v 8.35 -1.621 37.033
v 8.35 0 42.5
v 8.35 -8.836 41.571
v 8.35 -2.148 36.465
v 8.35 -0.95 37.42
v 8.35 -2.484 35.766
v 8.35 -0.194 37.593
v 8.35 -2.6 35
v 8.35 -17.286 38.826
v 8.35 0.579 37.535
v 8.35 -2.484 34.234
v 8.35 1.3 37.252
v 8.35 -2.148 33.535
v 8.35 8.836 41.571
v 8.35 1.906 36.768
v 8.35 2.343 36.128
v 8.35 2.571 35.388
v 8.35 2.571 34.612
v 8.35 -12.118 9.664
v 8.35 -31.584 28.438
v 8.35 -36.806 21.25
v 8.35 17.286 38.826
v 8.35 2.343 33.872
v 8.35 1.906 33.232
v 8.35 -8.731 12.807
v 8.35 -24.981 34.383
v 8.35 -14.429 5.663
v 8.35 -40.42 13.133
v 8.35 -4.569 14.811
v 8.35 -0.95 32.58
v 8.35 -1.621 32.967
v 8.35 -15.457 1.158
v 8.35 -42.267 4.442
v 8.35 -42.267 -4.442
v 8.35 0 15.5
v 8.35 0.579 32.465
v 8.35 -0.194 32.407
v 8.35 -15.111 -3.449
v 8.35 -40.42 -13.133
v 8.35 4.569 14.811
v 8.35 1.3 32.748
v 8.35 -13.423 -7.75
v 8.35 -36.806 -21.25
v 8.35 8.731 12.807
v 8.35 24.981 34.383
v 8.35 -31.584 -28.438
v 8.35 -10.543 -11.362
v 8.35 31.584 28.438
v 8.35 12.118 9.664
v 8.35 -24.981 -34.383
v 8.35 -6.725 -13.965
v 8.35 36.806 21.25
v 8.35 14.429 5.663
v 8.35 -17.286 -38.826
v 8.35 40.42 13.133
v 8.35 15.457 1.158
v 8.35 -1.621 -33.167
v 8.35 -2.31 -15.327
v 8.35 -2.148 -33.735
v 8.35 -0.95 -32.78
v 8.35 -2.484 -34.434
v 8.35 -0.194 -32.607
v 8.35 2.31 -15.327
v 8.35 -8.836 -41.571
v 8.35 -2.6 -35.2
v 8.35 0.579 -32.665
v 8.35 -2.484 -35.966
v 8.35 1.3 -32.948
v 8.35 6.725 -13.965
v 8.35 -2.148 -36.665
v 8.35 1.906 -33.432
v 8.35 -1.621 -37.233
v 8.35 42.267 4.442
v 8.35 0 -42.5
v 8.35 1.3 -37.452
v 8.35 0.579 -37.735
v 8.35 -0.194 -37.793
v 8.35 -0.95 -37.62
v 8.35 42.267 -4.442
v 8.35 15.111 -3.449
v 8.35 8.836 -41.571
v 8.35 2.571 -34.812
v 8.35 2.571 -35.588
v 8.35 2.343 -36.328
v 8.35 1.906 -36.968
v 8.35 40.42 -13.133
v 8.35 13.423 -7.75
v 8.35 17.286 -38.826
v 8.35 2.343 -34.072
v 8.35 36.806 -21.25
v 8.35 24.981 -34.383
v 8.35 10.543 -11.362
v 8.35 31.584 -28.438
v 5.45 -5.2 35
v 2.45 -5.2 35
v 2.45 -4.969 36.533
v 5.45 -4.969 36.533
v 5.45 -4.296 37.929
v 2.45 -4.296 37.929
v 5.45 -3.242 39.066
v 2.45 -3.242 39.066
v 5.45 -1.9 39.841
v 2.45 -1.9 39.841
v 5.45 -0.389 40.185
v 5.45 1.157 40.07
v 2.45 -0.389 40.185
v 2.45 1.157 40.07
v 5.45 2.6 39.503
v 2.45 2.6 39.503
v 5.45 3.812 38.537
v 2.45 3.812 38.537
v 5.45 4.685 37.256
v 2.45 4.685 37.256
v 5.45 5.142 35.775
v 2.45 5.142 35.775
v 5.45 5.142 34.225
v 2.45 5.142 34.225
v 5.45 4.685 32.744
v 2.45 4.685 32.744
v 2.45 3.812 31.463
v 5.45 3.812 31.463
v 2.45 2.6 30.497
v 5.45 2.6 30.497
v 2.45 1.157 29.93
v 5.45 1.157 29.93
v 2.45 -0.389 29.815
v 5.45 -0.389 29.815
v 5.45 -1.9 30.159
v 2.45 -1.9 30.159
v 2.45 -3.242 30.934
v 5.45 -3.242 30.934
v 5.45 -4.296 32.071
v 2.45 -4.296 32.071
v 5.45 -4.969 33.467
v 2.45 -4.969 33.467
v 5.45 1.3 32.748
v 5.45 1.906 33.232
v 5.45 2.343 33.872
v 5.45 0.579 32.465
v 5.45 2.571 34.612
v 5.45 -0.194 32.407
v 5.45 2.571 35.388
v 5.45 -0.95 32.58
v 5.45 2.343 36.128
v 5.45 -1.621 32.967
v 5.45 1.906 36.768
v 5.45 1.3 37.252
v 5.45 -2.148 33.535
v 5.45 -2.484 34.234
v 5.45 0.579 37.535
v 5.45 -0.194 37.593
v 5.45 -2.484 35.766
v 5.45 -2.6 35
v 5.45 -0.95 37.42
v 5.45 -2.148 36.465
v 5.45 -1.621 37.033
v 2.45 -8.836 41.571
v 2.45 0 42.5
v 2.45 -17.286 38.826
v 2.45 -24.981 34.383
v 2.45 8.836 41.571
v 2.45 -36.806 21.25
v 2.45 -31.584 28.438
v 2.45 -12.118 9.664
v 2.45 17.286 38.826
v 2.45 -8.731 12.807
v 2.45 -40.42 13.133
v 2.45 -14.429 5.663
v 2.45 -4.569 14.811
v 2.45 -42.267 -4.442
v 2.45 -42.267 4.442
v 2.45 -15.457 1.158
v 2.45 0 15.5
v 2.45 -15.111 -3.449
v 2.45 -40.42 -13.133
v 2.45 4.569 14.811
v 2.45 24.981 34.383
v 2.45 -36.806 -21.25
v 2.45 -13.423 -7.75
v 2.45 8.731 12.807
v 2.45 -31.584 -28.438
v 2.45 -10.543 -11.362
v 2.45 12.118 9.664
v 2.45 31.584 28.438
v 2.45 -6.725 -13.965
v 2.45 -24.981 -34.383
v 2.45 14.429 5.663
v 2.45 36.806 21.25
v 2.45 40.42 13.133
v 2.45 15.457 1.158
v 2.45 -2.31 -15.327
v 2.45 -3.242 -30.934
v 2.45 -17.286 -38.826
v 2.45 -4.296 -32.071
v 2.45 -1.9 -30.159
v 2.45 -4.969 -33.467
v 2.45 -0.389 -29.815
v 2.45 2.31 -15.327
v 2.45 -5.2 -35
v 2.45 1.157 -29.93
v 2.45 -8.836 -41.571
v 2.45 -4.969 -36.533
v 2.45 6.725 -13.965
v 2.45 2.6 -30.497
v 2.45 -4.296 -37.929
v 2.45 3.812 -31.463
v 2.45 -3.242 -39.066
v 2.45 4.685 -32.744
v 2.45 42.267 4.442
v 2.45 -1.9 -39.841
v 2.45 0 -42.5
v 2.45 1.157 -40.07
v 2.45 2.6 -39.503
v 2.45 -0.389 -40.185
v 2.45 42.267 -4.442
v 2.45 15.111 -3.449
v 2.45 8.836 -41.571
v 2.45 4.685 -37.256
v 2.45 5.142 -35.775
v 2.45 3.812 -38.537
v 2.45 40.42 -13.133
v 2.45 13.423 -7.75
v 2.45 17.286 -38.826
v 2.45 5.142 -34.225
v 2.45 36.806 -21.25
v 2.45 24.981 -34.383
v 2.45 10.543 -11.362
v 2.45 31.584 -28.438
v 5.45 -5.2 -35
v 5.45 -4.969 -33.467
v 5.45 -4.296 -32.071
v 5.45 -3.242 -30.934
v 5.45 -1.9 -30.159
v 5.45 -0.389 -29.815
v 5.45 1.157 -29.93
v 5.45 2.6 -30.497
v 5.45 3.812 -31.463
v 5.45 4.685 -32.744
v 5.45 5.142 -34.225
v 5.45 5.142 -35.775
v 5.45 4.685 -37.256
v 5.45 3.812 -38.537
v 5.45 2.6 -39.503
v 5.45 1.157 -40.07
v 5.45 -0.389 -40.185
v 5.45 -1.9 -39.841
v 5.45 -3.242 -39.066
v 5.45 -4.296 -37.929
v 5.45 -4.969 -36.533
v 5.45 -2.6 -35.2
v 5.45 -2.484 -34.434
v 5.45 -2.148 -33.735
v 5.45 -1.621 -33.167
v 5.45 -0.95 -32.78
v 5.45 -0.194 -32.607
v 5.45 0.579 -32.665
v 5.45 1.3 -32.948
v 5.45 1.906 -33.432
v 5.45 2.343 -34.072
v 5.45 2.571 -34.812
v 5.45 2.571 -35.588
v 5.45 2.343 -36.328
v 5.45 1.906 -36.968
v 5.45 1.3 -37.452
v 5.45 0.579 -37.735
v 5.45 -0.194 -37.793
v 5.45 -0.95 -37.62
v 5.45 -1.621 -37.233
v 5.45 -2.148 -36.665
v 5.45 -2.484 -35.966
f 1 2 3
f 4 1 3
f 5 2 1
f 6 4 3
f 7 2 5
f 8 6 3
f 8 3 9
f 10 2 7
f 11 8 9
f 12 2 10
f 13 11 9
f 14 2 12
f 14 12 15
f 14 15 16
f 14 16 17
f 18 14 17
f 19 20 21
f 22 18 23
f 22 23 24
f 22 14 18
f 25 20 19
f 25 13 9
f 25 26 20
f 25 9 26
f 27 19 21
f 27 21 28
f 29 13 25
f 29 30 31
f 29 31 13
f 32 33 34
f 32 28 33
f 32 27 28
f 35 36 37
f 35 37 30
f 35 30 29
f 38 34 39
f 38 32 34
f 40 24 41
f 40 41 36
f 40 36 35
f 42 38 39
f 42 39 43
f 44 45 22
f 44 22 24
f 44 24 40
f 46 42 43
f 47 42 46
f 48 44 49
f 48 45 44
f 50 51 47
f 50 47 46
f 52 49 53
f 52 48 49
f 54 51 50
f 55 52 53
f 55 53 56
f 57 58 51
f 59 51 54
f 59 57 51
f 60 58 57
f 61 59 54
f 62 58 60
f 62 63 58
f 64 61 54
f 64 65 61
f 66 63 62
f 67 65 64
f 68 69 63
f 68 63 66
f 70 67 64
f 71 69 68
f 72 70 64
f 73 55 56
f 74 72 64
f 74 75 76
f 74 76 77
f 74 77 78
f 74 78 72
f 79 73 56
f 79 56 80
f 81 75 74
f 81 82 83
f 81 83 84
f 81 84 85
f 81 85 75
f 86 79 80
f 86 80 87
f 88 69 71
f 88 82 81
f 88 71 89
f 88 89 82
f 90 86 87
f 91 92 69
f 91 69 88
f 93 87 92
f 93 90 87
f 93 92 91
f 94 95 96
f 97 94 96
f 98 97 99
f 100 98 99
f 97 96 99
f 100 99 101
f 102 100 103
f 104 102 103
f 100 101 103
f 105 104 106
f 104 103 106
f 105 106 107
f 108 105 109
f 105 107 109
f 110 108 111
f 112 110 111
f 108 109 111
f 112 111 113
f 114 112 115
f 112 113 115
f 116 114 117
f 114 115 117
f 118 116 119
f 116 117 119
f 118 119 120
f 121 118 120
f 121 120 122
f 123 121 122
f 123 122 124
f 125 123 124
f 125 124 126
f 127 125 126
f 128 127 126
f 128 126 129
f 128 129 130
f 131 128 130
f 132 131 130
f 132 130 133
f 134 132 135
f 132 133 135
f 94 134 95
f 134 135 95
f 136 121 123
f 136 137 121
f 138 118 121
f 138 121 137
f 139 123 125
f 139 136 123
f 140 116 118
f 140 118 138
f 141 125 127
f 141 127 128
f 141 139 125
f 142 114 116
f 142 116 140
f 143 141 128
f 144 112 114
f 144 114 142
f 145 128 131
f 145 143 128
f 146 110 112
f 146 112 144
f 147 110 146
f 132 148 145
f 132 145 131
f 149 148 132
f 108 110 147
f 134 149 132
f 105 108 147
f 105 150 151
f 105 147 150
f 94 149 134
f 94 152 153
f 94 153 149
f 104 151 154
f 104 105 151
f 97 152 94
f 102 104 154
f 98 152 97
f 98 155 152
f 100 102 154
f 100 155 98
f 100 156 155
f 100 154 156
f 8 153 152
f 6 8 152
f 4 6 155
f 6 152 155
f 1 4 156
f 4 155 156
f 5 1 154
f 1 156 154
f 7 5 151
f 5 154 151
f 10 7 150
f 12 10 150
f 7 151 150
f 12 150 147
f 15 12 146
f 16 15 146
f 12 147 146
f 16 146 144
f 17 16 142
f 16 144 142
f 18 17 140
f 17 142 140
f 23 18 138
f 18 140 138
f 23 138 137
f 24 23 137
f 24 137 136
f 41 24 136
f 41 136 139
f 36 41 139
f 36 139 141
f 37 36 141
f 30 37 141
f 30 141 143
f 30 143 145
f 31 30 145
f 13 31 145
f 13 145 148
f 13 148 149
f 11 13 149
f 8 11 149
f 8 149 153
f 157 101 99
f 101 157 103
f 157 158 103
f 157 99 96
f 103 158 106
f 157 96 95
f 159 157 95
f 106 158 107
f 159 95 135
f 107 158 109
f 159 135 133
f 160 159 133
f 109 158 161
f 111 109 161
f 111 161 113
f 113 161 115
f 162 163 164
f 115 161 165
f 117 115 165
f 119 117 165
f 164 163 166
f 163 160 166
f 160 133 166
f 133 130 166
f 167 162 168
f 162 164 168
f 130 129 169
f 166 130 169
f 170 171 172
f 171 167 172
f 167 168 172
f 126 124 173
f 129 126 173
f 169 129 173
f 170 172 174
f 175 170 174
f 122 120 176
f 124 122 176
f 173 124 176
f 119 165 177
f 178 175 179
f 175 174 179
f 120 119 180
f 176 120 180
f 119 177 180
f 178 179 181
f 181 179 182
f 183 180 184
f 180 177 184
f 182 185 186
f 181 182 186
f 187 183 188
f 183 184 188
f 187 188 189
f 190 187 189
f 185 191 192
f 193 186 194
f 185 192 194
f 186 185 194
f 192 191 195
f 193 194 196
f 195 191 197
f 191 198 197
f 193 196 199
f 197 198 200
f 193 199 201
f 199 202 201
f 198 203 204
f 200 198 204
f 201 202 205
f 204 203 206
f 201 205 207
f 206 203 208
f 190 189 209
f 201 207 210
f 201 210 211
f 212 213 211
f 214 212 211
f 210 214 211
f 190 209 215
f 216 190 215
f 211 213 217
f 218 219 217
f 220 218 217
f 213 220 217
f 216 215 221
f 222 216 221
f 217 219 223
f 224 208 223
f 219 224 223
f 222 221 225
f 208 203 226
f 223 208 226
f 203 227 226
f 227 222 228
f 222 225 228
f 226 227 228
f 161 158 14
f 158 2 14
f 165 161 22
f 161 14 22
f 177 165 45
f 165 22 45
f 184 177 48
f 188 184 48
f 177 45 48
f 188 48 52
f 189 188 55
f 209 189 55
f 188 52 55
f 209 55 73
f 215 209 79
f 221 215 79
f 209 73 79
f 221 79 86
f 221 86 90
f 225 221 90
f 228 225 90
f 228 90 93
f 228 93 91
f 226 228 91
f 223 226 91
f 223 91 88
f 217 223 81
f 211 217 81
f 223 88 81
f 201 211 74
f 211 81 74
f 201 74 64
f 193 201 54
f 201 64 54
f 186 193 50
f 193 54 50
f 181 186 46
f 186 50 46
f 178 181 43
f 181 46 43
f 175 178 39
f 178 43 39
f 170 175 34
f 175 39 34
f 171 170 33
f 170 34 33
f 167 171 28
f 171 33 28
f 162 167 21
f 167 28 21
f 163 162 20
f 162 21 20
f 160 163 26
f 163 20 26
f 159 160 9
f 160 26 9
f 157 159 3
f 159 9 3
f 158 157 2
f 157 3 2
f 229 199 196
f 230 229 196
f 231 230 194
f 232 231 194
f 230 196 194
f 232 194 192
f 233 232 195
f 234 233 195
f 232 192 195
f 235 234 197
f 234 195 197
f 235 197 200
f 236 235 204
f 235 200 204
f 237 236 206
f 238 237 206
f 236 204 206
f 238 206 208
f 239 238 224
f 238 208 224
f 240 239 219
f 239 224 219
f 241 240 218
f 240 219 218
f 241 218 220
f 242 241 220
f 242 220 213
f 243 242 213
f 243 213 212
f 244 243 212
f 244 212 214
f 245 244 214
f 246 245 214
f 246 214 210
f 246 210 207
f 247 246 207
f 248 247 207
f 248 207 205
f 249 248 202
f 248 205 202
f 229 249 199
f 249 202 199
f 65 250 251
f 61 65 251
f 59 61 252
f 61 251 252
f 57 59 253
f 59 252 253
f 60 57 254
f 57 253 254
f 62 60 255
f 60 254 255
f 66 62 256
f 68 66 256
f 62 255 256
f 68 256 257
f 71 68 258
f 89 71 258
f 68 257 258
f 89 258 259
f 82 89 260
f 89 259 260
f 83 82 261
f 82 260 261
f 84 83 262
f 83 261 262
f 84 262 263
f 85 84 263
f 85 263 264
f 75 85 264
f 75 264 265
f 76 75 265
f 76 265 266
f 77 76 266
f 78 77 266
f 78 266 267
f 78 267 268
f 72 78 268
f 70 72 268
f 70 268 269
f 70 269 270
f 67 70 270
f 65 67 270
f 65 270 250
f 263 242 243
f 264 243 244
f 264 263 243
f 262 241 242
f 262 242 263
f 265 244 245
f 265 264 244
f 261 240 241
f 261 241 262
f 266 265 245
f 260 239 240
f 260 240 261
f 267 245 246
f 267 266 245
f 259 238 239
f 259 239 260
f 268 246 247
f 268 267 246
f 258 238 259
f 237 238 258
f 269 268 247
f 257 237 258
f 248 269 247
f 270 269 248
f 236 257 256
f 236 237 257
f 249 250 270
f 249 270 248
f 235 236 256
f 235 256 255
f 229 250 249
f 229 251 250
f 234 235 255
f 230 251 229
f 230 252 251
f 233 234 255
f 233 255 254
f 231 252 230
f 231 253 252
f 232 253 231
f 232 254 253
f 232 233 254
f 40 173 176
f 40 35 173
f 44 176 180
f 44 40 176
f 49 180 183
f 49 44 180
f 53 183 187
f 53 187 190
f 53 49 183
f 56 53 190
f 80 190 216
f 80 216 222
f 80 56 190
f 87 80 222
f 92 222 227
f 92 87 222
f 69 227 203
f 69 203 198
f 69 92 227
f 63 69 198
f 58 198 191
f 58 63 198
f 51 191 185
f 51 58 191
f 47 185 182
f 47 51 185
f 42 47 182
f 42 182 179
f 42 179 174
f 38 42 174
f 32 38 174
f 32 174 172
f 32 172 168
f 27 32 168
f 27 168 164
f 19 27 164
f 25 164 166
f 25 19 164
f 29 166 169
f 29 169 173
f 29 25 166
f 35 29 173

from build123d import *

# Parameters (mm, degrees)
F0_W     = 5.9
F0_H     = 27
F2_R     = 5.2
F3_DEPTH = 3
F4_R     = 2.6
F5_DEPTH = 25


with BuildPart() as f1:
    # F0 (on Front) → F1 (revolve)
    with BuildSketch(Plane.XZ):
        with Locations((5.399999, 29)):
            Rectangle(F0_W, F0_H)
    revolve(axis=Axis((-4.686111, 0, 0), (-1, 0, 0)))

    # F2 (on face) → F3 (cut)
    with BuildSketch(Plane(origin=(2.449999, 0, 0), x_dir=(0, -1, 0), z_dir=(-1, 0, 0))):
        with Locations((0, 35)):
            Circle(F2_R)
        with Locations((0, -35)):
            Circle(F2_R)
    extrude(amount=-F3_DEPTH, mode=Mode.SUBTRACT)

    # F4 (on face) → F5 (cut)
    with BuildSketch(Plane(origin=(5.449999, 0, 0), x_dir=(0, -1, 0), z_dir=(-1, 0, 0))):
        with Locations((0, -35.2)):
            Circle(F4_R)
        with Locations((0, 35)):
            Circle(F4_R)
    extrude(amount=-F5_DEPTH, mode=Mode.SUBTRACT)


solid = f1.part
